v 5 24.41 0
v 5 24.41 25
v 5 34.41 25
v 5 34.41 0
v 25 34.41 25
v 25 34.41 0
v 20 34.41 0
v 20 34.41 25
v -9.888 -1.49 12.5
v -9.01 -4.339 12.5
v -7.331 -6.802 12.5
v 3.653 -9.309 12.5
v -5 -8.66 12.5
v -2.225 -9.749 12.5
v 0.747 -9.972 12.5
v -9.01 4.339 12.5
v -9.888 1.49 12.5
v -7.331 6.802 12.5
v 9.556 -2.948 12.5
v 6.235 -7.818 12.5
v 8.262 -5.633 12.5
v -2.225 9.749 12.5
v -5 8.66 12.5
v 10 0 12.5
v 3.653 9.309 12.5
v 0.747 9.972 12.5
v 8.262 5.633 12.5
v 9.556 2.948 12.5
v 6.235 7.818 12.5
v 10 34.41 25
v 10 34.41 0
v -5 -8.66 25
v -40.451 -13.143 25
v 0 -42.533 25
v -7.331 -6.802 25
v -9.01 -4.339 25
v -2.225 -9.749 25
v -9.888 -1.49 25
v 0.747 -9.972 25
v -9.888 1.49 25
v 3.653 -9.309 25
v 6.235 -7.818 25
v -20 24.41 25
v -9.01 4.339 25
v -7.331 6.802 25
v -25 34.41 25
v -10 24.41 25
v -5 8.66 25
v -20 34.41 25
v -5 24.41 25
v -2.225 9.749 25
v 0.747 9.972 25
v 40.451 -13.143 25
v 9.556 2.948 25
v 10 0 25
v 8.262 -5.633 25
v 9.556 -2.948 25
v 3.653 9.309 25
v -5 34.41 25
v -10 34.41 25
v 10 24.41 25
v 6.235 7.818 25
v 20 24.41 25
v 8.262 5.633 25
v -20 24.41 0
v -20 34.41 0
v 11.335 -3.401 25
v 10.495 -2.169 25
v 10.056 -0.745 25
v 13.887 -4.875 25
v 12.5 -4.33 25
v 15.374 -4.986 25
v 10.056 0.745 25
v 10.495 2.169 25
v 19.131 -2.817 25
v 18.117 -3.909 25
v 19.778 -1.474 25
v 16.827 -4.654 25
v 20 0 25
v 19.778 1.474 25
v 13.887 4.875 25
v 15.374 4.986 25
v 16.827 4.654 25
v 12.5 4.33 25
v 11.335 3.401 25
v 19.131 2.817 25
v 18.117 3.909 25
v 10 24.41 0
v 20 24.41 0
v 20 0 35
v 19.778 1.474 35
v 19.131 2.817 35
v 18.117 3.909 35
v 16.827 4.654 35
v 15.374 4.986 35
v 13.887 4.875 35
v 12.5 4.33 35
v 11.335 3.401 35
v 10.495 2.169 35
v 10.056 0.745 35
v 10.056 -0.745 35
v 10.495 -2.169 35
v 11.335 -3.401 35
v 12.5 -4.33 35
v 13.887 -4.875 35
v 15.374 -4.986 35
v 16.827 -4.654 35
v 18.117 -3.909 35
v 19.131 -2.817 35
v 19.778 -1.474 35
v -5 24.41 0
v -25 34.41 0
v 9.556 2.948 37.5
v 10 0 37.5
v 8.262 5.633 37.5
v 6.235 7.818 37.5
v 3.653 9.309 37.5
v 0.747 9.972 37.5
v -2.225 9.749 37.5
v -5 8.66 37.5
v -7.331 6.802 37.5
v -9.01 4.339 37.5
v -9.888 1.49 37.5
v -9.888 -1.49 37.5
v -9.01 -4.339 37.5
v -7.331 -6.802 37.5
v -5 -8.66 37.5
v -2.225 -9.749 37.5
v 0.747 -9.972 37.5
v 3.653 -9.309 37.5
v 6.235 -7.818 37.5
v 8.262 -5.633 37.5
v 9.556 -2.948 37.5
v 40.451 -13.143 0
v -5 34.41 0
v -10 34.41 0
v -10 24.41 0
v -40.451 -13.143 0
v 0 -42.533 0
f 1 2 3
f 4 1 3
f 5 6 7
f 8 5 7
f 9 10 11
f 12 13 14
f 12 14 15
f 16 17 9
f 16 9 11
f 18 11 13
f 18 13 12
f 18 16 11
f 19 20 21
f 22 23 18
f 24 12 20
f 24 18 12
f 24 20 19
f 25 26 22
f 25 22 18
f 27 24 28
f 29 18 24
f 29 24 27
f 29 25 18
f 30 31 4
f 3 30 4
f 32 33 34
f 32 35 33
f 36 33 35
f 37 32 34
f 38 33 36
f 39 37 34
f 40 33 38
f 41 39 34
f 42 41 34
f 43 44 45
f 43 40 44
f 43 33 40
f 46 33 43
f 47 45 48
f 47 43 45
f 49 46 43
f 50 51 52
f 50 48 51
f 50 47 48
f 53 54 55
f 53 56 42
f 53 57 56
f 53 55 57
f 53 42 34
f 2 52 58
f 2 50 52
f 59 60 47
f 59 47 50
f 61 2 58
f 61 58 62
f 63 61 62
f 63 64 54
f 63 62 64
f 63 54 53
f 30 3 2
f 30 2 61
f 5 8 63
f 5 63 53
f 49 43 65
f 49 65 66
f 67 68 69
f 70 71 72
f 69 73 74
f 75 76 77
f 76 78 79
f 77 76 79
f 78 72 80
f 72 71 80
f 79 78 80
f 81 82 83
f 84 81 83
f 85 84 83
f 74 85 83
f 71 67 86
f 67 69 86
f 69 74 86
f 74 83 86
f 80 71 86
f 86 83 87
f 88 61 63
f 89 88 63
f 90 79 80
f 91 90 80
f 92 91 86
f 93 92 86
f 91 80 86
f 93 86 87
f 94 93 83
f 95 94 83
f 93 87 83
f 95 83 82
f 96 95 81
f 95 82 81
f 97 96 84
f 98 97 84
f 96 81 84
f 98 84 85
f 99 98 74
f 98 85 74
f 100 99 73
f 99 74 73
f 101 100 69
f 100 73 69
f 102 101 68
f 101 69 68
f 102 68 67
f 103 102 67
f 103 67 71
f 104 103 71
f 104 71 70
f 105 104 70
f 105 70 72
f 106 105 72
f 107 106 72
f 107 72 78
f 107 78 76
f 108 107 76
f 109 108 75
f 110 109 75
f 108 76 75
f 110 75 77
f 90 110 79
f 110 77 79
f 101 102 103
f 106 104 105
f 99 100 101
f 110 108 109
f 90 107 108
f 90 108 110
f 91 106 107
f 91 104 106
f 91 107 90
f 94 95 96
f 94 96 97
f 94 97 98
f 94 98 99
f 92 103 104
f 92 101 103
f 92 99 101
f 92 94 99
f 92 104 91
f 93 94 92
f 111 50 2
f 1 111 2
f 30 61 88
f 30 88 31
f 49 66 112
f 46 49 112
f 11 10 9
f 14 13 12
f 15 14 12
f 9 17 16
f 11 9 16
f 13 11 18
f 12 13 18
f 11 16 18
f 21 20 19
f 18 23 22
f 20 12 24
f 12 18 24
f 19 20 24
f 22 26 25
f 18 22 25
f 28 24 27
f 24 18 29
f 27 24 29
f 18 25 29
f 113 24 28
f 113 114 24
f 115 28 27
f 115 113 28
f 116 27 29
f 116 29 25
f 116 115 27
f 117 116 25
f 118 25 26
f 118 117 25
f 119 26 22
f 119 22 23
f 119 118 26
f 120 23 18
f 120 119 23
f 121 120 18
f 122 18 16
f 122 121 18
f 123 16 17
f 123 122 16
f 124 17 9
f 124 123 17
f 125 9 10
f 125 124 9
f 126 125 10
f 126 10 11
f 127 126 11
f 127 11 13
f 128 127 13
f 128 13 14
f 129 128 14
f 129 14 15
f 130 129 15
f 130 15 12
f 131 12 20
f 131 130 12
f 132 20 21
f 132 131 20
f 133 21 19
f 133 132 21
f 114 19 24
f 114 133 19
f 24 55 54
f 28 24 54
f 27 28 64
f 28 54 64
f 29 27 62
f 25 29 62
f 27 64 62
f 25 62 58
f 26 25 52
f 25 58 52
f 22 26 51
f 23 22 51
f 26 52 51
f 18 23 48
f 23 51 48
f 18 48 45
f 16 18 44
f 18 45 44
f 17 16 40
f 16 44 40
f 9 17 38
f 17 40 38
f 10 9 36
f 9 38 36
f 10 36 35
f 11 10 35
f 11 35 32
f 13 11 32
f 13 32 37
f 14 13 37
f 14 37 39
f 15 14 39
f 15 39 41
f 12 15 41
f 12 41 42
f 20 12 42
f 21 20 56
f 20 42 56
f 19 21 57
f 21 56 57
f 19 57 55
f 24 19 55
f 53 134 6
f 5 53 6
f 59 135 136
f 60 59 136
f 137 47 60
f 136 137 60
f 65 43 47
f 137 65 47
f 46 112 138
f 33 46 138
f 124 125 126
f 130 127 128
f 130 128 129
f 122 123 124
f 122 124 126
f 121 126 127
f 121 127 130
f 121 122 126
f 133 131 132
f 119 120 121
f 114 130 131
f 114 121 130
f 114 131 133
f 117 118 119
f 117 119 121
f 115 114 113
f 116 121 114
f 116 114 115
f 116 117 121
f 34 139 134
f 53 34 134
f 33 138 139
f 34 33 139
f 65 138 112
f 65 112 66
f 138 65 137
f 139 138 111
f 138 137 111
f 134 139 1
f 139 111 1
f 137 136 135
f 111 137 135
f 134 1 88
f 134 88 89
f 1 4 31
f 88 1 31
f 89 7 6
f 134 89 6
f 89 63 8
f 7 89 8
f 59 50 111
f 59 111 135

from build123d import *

# Parameters (mm, degrees)
F1_DEPTH = 25
F2_W     = 10
F2_H     = 10
F3_DEPTH = 25
F4_R     = 10
F5_DEPTH = 12.5
F7_R     = 5
F8_DEPTH = 10


with BuildPart() as f1:
    # F0 (on Top) → F1 (new body)
    with BuildSketch(Plane.XY):
        Polygon((-25, 34.409548), (-40.45085, -13.143278), (0, -42.53254), (40.45085, -13.143278), (25, 34.409548), align=None)
    extrude(amount=F1_DEPTH)

    # F2 (on face) → F3 (cut, through all)
    with BuildSketch(Plane.XY.offset(25)):
        with Locations((-15, 29.409548)):
            Rectangle(F2_W, F2_H)
        with Locations((0, 29.409548)):
            Rectangle(F2_W, F2_H)
        with Locations((15, 29.409548)):
            Rectangle(F2_W, F2_H)
    extrude(amount=-F3_DEPTH, mode=Mode.SUBTRACT)


with BuildPart() as f5:
    # F4 (on face) → F5 (new body, symmetric)
    with BuildSketch(Plane.XY.offset(25)):
        Circle(F4_R)
    extrude(amount=F5_DEPTH, both=True)


with BuildPart() as f1_1:
    add(f1.part)

    # F6: cut F5
    add(f5.part, mode=Mode.SUBTRACT)


with BuildPart() as f8:
    # F7 (on face) → F8 (new body)
    with BuildSketch(Plane.XY.offset(25)):
        with Locations((15, 0)):
            Circle(F7_R)
    extrude(amount=F8_DEPTH)


solid = Compound([f5.part, f1_1.part, f8.part])
